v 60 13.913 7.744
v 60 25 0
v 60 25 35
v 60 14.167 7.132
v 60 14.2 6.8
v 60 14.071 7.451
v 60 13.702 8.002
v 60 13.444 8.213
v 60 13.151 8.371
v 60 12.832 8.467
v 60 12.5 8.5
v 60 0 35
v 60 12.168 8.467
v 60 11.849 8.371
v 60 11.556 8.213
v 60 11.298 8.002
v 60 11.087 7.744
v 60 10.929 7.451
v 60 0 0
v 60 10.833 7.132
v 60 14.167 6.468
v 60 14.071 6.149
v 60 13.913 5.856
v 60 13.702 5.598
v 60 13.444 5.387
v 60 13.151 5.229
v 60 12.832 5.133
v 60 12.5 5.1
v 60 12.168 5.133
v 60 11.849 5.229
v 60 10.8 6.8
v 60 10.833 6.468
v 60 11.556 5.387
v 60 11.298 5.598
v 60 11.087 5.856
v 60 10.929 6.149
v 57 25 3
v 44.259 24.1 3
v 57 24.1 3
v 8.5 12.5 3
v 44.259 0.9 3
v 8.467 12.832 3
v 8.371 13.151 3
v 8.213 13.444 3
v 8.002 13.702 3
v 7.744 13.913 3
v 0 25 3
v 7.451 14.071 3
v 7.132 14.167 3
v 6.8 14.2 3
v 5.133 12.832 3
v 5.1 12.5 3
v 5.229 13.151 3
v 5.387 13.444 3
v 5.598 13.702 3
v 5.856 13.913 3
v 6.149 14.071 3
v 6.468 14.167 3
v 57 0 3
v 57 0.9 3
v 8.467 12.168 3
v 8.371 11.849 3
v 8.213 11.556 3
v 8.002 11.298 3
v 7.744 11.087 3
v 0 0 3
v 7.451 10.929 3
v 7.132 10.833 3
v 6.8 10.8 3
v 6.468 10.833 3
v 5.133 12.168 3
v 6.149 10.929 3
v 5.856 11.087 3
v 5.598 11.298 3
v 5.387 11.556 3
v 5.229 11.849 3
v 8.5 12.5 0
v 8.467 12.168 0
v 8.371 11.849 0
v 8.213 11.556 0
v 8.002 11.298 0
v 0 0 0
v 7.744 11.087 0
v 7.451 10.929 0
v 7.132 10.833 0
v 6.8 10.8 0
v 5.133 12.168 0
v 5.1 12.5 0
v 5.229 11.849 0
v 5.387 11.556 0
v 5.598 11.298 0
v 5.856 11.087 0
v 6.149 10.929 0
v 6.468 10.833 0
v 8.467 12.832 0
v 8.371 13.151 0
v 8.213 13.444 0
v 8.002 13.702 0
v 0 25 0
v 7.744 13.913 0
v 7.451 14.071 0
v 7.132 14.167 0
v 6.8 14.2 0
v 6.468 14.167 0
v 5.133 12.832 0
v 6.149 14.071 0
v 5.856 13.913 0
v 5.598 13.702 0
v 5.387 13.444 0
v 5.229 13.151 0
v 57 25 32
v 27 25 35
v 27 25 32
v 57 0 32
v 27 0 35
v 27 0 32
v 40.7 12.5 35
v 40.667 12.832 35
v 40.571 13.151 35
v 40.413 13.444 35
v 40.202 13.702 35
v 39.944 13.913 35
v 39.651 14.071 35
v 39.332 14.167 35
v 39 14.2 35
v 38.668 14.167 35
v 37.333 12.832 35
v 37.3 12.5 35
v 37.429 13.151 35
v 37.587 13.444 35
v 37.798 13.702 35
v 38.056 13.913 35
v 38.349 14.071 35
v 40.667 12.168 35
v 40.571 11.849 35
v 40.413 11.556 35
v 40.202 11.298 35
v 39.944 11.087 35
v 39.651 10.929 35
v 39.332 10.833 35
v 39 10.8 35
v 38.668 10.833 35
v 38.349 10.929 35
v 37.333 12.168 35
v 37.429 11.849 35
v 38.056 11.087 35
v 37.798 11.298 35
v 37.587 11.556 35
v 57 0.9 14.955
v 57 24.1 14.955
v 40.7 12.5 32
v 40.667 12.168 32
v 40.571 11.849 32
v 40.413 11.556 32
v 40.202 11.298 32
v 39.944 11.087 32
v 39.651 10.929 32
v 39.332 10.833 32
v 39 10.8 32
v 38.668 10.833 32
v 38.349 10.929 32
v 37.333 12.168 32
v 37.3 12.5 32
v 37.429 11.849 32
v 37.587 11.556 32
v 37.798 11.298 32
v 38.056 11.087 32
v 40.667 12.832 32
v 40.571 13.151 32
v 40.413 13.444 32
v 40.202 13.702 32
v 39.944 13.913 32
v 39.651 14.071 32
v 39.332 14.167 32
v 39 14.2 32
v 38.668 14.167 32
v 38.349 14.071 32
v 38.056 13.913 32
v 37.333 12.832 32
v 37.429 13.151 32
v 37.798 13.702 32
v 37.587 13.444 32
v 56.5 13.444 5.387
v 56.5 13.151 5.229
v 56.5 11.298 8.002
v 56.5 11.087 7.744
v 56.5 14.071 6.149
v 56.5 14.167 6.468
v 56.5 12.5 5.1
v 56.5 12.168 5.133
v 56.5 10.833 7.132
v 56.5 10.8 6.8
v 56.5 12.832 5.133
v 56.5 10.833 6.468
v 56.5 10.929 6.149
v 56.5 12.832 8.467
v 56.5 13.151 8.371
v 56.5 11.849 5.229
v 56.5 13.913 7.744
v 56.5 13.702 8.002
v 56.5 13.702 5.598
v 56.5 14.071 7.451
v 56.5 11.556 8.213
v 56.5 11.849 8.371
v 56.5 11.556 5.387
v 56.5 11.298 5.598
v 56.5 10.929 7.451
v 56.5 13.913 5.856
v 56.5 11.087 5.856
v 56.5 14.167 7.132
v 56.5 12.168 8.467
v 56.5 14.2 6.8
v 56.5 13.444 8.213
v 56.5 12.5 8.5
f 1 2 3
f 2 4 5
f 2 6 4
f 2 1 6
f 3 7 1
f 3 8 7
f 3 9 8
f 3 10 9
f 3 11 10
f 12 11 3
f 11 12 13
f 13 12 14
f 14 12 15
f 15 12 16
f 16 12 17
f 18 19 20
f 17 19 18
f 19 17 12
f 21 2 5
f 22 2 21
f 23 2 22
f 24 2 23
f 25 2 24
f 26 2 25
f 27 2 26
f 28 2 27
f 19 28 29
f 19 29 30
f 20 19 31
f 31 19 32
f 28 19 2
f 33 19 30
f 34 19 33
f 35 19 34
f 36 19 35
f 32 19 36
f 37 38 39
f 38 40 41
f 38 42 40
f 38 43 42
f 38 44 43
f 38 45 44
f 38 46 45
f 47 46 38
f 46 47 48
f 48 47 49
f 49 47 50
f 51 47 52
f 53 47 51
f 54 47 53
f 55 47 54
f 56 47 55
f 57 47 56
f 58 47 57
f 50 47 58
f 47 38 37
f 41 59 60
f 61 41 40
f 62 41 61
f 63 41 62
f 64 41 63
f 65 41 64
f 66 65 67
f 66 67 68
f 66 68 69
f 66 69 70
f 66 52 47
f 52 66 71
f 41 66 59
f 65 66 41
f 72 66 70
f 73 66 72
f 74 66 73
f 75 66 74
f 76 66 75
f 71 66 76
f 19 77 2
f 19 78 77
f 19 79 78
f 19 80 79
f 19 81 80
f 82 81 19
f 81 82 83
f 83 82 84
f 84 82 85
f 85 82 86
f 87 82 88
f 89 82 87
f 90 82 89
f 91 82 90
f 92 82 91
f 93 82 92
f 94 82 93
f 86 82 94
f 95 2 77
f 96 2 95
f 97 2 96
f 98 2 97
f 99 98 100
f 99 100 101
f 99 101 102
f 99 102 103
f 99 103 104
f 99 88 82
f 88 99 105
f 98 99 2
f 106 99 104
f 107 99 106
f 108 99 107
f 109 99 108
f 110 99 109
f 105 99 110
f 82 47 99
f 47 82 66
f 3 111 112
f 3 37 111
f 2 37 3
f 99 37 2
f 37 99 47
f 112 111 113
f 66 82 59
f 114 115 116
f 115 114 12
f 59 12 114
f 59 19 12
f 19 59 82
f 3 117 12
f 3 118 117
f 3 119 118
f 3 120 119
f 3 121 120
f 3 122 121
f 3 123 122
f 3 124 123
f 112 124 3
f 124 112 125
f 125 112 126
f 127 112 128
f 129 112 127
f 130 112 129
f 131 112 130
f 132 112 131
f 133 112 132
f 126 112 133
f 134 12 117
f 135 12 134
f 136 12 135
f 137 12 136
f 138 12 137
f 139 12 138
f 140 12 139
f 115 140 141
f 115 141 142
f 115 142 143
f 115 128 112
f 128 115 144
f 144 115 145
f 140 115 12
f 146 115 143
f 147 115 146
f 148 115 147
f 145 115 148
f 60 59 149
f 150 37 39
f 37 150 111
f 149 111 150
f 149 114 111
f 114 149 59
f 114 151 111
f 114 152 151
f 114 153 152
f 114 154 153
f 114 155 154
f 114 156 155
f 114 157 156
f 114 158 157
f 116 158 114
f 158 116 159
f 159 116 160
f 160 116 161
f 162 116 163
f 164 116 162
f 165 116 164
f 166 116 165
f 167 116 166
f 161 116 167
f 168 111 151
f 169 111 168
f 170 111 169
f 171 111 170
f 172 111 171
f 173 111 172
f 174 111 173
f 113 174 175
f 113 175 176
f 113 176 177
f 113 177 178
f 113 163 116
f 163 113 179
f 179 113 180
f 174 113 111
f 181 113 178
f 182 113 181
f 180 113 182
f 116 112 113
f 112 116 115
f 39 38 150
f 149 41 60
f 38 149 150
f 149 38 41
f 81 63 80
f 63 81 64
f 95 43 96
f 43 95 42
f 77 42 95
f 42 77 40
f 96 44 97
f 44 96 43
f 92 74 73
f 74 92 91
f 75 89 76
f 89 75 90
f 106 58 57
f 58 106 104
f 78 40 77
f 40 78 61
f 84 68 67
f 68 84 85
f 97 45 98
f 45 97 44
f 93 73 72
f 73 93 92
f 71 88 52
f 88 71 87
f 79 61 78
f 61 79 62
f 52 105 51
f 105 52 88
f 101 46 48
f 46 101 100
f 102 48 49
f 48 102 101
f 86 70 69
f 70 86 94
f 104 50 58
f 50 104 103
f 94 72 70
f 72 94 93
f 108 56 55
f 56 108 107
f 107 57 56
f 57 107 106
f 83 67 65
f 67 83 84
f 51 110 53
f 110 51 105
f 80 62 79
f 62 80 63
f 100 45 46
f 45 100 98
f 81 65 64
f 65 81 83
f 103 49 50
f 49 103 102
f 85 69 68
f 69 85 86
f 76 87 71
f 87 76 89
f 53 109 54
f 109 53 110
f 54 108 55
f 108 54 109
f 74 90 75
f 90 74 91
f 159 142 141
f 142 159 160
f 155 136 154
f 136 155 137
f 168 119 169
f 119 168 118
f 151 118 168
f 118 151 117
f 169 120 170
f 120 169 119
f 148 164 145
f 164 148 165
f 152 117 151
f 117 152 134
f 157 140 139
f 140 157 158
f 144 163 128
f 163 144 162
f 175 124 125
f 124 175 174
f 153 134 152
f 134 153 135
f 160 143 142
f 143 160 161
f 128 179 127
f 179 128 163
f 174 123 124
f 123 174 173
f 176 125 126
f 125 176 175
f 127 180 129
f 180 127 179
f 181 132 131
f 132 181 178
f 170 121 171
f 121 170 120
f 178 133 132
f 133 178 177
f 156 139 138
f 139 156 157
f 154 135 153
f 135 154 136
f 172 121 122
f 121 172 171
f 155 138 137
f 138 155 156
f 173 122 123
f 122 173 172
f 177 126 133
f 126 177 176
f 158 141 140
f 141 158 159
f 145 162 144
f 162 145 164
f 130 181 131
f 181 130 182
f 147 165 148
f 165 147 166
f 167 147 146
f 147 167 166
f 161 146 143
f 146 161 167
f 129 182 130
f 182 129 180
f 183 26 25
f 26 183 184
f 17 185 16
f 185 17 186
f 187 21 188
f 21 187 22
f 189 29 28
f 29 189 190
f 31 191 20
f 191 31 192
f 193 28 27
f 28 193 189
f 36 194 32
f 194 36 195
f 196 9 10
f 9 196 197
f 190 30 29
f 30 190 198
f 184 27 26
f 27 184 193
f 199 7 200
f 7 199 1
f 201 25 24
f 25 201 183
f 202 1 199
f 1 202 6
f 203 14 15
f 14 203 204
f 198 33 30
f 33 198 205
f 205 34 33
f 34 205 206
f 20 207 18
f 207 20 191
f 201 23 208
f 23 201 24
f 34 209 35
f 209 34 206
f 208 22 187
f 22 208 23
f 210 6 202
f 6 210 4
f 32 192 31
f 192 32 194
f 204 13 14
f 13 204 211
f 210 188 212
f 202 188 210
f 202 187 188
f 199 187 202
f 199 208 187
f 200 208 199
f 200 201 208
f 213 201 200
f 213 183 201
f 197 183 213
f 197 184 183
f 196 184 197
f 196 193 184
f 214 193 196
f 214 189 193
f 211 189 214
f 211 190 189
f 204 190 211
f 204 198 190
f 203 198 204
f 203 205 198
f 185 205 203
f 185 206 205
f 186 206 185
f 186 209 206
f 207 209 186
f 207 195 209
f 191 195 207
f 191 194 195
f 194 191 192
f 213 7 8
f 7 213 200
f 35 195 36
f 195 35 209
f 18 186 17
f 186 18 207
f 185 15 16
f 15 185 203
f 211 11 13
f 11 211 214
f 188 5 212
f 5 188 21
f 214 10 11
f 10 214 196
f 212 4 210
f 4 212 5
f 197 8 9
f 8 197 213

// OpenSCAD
$fn = 32;

// ----------------------------------------------------------------------
// Z-bracket: 60 x 25 x 35 mm
// ----------------------------------------------------------------------

// --- parameters (mm) ---
bottom_run = 60;          // lower foot length, X
top_run = 30;             // upper foot length, X
profile_w = 25;           // bracket width, Y
height = 35;              // overall rise, Z
mat_t = 3;                // plate thickness
hole_d = 3.4;             // clearance for M3
rib_len = 13.7;           // gusset leg
rib_sink = 0.9;           // gusset overlap into the plates

module hole_z(px, py, z0) {
  translate([px, py, z0 - 0.5]) cylinder(h = mat_t + 1, d = hole_d);
}
module hole_x(py, pz) {
  translate([-0.5, py, pz]) rotate([0, 90, 0]) cylinder(h = mat_t + 1, d = hole_d);
}
module gusset(x0) {
  translate([x0, profile_w - rib_sink, 0])
    rotate([90, 0, 0])
      linear_extrude(height = profile_w - 2 * rib_sink)
        polygon(points = [[rib_sink, mat_t - rib_sink],
                          [rib_sink, mat_t - rib_sink + rib_len],
                          [-rib_len, mat_t - rib_sink]]);
}

difference() {
  union() {
    cube([bottom_run, profile_w, mat_t]);
    /* web, overlapping the lower foot */
    translate([bottom_run - mat_t, 0, 0]) cube([mat_t, profile_w, height]);
    /* upper foot, sunk into the web */
    translate([bottom_run - mat_t - top_run, 0, height - mat_t]) cube([top_run + mat_t, profile_w, mat_t]);
    gusset(bottom_run - mat_t);
  }
  hole_z(6.8, 12.5, 0);
  translate([bottom_run - mat_t - 18, 0, 0]) hole_z(0, 12.5, height - mat_t);
  translate([bottom_run - mat_t, 0, 0]) hole_x(12.5, 6.8);
}
